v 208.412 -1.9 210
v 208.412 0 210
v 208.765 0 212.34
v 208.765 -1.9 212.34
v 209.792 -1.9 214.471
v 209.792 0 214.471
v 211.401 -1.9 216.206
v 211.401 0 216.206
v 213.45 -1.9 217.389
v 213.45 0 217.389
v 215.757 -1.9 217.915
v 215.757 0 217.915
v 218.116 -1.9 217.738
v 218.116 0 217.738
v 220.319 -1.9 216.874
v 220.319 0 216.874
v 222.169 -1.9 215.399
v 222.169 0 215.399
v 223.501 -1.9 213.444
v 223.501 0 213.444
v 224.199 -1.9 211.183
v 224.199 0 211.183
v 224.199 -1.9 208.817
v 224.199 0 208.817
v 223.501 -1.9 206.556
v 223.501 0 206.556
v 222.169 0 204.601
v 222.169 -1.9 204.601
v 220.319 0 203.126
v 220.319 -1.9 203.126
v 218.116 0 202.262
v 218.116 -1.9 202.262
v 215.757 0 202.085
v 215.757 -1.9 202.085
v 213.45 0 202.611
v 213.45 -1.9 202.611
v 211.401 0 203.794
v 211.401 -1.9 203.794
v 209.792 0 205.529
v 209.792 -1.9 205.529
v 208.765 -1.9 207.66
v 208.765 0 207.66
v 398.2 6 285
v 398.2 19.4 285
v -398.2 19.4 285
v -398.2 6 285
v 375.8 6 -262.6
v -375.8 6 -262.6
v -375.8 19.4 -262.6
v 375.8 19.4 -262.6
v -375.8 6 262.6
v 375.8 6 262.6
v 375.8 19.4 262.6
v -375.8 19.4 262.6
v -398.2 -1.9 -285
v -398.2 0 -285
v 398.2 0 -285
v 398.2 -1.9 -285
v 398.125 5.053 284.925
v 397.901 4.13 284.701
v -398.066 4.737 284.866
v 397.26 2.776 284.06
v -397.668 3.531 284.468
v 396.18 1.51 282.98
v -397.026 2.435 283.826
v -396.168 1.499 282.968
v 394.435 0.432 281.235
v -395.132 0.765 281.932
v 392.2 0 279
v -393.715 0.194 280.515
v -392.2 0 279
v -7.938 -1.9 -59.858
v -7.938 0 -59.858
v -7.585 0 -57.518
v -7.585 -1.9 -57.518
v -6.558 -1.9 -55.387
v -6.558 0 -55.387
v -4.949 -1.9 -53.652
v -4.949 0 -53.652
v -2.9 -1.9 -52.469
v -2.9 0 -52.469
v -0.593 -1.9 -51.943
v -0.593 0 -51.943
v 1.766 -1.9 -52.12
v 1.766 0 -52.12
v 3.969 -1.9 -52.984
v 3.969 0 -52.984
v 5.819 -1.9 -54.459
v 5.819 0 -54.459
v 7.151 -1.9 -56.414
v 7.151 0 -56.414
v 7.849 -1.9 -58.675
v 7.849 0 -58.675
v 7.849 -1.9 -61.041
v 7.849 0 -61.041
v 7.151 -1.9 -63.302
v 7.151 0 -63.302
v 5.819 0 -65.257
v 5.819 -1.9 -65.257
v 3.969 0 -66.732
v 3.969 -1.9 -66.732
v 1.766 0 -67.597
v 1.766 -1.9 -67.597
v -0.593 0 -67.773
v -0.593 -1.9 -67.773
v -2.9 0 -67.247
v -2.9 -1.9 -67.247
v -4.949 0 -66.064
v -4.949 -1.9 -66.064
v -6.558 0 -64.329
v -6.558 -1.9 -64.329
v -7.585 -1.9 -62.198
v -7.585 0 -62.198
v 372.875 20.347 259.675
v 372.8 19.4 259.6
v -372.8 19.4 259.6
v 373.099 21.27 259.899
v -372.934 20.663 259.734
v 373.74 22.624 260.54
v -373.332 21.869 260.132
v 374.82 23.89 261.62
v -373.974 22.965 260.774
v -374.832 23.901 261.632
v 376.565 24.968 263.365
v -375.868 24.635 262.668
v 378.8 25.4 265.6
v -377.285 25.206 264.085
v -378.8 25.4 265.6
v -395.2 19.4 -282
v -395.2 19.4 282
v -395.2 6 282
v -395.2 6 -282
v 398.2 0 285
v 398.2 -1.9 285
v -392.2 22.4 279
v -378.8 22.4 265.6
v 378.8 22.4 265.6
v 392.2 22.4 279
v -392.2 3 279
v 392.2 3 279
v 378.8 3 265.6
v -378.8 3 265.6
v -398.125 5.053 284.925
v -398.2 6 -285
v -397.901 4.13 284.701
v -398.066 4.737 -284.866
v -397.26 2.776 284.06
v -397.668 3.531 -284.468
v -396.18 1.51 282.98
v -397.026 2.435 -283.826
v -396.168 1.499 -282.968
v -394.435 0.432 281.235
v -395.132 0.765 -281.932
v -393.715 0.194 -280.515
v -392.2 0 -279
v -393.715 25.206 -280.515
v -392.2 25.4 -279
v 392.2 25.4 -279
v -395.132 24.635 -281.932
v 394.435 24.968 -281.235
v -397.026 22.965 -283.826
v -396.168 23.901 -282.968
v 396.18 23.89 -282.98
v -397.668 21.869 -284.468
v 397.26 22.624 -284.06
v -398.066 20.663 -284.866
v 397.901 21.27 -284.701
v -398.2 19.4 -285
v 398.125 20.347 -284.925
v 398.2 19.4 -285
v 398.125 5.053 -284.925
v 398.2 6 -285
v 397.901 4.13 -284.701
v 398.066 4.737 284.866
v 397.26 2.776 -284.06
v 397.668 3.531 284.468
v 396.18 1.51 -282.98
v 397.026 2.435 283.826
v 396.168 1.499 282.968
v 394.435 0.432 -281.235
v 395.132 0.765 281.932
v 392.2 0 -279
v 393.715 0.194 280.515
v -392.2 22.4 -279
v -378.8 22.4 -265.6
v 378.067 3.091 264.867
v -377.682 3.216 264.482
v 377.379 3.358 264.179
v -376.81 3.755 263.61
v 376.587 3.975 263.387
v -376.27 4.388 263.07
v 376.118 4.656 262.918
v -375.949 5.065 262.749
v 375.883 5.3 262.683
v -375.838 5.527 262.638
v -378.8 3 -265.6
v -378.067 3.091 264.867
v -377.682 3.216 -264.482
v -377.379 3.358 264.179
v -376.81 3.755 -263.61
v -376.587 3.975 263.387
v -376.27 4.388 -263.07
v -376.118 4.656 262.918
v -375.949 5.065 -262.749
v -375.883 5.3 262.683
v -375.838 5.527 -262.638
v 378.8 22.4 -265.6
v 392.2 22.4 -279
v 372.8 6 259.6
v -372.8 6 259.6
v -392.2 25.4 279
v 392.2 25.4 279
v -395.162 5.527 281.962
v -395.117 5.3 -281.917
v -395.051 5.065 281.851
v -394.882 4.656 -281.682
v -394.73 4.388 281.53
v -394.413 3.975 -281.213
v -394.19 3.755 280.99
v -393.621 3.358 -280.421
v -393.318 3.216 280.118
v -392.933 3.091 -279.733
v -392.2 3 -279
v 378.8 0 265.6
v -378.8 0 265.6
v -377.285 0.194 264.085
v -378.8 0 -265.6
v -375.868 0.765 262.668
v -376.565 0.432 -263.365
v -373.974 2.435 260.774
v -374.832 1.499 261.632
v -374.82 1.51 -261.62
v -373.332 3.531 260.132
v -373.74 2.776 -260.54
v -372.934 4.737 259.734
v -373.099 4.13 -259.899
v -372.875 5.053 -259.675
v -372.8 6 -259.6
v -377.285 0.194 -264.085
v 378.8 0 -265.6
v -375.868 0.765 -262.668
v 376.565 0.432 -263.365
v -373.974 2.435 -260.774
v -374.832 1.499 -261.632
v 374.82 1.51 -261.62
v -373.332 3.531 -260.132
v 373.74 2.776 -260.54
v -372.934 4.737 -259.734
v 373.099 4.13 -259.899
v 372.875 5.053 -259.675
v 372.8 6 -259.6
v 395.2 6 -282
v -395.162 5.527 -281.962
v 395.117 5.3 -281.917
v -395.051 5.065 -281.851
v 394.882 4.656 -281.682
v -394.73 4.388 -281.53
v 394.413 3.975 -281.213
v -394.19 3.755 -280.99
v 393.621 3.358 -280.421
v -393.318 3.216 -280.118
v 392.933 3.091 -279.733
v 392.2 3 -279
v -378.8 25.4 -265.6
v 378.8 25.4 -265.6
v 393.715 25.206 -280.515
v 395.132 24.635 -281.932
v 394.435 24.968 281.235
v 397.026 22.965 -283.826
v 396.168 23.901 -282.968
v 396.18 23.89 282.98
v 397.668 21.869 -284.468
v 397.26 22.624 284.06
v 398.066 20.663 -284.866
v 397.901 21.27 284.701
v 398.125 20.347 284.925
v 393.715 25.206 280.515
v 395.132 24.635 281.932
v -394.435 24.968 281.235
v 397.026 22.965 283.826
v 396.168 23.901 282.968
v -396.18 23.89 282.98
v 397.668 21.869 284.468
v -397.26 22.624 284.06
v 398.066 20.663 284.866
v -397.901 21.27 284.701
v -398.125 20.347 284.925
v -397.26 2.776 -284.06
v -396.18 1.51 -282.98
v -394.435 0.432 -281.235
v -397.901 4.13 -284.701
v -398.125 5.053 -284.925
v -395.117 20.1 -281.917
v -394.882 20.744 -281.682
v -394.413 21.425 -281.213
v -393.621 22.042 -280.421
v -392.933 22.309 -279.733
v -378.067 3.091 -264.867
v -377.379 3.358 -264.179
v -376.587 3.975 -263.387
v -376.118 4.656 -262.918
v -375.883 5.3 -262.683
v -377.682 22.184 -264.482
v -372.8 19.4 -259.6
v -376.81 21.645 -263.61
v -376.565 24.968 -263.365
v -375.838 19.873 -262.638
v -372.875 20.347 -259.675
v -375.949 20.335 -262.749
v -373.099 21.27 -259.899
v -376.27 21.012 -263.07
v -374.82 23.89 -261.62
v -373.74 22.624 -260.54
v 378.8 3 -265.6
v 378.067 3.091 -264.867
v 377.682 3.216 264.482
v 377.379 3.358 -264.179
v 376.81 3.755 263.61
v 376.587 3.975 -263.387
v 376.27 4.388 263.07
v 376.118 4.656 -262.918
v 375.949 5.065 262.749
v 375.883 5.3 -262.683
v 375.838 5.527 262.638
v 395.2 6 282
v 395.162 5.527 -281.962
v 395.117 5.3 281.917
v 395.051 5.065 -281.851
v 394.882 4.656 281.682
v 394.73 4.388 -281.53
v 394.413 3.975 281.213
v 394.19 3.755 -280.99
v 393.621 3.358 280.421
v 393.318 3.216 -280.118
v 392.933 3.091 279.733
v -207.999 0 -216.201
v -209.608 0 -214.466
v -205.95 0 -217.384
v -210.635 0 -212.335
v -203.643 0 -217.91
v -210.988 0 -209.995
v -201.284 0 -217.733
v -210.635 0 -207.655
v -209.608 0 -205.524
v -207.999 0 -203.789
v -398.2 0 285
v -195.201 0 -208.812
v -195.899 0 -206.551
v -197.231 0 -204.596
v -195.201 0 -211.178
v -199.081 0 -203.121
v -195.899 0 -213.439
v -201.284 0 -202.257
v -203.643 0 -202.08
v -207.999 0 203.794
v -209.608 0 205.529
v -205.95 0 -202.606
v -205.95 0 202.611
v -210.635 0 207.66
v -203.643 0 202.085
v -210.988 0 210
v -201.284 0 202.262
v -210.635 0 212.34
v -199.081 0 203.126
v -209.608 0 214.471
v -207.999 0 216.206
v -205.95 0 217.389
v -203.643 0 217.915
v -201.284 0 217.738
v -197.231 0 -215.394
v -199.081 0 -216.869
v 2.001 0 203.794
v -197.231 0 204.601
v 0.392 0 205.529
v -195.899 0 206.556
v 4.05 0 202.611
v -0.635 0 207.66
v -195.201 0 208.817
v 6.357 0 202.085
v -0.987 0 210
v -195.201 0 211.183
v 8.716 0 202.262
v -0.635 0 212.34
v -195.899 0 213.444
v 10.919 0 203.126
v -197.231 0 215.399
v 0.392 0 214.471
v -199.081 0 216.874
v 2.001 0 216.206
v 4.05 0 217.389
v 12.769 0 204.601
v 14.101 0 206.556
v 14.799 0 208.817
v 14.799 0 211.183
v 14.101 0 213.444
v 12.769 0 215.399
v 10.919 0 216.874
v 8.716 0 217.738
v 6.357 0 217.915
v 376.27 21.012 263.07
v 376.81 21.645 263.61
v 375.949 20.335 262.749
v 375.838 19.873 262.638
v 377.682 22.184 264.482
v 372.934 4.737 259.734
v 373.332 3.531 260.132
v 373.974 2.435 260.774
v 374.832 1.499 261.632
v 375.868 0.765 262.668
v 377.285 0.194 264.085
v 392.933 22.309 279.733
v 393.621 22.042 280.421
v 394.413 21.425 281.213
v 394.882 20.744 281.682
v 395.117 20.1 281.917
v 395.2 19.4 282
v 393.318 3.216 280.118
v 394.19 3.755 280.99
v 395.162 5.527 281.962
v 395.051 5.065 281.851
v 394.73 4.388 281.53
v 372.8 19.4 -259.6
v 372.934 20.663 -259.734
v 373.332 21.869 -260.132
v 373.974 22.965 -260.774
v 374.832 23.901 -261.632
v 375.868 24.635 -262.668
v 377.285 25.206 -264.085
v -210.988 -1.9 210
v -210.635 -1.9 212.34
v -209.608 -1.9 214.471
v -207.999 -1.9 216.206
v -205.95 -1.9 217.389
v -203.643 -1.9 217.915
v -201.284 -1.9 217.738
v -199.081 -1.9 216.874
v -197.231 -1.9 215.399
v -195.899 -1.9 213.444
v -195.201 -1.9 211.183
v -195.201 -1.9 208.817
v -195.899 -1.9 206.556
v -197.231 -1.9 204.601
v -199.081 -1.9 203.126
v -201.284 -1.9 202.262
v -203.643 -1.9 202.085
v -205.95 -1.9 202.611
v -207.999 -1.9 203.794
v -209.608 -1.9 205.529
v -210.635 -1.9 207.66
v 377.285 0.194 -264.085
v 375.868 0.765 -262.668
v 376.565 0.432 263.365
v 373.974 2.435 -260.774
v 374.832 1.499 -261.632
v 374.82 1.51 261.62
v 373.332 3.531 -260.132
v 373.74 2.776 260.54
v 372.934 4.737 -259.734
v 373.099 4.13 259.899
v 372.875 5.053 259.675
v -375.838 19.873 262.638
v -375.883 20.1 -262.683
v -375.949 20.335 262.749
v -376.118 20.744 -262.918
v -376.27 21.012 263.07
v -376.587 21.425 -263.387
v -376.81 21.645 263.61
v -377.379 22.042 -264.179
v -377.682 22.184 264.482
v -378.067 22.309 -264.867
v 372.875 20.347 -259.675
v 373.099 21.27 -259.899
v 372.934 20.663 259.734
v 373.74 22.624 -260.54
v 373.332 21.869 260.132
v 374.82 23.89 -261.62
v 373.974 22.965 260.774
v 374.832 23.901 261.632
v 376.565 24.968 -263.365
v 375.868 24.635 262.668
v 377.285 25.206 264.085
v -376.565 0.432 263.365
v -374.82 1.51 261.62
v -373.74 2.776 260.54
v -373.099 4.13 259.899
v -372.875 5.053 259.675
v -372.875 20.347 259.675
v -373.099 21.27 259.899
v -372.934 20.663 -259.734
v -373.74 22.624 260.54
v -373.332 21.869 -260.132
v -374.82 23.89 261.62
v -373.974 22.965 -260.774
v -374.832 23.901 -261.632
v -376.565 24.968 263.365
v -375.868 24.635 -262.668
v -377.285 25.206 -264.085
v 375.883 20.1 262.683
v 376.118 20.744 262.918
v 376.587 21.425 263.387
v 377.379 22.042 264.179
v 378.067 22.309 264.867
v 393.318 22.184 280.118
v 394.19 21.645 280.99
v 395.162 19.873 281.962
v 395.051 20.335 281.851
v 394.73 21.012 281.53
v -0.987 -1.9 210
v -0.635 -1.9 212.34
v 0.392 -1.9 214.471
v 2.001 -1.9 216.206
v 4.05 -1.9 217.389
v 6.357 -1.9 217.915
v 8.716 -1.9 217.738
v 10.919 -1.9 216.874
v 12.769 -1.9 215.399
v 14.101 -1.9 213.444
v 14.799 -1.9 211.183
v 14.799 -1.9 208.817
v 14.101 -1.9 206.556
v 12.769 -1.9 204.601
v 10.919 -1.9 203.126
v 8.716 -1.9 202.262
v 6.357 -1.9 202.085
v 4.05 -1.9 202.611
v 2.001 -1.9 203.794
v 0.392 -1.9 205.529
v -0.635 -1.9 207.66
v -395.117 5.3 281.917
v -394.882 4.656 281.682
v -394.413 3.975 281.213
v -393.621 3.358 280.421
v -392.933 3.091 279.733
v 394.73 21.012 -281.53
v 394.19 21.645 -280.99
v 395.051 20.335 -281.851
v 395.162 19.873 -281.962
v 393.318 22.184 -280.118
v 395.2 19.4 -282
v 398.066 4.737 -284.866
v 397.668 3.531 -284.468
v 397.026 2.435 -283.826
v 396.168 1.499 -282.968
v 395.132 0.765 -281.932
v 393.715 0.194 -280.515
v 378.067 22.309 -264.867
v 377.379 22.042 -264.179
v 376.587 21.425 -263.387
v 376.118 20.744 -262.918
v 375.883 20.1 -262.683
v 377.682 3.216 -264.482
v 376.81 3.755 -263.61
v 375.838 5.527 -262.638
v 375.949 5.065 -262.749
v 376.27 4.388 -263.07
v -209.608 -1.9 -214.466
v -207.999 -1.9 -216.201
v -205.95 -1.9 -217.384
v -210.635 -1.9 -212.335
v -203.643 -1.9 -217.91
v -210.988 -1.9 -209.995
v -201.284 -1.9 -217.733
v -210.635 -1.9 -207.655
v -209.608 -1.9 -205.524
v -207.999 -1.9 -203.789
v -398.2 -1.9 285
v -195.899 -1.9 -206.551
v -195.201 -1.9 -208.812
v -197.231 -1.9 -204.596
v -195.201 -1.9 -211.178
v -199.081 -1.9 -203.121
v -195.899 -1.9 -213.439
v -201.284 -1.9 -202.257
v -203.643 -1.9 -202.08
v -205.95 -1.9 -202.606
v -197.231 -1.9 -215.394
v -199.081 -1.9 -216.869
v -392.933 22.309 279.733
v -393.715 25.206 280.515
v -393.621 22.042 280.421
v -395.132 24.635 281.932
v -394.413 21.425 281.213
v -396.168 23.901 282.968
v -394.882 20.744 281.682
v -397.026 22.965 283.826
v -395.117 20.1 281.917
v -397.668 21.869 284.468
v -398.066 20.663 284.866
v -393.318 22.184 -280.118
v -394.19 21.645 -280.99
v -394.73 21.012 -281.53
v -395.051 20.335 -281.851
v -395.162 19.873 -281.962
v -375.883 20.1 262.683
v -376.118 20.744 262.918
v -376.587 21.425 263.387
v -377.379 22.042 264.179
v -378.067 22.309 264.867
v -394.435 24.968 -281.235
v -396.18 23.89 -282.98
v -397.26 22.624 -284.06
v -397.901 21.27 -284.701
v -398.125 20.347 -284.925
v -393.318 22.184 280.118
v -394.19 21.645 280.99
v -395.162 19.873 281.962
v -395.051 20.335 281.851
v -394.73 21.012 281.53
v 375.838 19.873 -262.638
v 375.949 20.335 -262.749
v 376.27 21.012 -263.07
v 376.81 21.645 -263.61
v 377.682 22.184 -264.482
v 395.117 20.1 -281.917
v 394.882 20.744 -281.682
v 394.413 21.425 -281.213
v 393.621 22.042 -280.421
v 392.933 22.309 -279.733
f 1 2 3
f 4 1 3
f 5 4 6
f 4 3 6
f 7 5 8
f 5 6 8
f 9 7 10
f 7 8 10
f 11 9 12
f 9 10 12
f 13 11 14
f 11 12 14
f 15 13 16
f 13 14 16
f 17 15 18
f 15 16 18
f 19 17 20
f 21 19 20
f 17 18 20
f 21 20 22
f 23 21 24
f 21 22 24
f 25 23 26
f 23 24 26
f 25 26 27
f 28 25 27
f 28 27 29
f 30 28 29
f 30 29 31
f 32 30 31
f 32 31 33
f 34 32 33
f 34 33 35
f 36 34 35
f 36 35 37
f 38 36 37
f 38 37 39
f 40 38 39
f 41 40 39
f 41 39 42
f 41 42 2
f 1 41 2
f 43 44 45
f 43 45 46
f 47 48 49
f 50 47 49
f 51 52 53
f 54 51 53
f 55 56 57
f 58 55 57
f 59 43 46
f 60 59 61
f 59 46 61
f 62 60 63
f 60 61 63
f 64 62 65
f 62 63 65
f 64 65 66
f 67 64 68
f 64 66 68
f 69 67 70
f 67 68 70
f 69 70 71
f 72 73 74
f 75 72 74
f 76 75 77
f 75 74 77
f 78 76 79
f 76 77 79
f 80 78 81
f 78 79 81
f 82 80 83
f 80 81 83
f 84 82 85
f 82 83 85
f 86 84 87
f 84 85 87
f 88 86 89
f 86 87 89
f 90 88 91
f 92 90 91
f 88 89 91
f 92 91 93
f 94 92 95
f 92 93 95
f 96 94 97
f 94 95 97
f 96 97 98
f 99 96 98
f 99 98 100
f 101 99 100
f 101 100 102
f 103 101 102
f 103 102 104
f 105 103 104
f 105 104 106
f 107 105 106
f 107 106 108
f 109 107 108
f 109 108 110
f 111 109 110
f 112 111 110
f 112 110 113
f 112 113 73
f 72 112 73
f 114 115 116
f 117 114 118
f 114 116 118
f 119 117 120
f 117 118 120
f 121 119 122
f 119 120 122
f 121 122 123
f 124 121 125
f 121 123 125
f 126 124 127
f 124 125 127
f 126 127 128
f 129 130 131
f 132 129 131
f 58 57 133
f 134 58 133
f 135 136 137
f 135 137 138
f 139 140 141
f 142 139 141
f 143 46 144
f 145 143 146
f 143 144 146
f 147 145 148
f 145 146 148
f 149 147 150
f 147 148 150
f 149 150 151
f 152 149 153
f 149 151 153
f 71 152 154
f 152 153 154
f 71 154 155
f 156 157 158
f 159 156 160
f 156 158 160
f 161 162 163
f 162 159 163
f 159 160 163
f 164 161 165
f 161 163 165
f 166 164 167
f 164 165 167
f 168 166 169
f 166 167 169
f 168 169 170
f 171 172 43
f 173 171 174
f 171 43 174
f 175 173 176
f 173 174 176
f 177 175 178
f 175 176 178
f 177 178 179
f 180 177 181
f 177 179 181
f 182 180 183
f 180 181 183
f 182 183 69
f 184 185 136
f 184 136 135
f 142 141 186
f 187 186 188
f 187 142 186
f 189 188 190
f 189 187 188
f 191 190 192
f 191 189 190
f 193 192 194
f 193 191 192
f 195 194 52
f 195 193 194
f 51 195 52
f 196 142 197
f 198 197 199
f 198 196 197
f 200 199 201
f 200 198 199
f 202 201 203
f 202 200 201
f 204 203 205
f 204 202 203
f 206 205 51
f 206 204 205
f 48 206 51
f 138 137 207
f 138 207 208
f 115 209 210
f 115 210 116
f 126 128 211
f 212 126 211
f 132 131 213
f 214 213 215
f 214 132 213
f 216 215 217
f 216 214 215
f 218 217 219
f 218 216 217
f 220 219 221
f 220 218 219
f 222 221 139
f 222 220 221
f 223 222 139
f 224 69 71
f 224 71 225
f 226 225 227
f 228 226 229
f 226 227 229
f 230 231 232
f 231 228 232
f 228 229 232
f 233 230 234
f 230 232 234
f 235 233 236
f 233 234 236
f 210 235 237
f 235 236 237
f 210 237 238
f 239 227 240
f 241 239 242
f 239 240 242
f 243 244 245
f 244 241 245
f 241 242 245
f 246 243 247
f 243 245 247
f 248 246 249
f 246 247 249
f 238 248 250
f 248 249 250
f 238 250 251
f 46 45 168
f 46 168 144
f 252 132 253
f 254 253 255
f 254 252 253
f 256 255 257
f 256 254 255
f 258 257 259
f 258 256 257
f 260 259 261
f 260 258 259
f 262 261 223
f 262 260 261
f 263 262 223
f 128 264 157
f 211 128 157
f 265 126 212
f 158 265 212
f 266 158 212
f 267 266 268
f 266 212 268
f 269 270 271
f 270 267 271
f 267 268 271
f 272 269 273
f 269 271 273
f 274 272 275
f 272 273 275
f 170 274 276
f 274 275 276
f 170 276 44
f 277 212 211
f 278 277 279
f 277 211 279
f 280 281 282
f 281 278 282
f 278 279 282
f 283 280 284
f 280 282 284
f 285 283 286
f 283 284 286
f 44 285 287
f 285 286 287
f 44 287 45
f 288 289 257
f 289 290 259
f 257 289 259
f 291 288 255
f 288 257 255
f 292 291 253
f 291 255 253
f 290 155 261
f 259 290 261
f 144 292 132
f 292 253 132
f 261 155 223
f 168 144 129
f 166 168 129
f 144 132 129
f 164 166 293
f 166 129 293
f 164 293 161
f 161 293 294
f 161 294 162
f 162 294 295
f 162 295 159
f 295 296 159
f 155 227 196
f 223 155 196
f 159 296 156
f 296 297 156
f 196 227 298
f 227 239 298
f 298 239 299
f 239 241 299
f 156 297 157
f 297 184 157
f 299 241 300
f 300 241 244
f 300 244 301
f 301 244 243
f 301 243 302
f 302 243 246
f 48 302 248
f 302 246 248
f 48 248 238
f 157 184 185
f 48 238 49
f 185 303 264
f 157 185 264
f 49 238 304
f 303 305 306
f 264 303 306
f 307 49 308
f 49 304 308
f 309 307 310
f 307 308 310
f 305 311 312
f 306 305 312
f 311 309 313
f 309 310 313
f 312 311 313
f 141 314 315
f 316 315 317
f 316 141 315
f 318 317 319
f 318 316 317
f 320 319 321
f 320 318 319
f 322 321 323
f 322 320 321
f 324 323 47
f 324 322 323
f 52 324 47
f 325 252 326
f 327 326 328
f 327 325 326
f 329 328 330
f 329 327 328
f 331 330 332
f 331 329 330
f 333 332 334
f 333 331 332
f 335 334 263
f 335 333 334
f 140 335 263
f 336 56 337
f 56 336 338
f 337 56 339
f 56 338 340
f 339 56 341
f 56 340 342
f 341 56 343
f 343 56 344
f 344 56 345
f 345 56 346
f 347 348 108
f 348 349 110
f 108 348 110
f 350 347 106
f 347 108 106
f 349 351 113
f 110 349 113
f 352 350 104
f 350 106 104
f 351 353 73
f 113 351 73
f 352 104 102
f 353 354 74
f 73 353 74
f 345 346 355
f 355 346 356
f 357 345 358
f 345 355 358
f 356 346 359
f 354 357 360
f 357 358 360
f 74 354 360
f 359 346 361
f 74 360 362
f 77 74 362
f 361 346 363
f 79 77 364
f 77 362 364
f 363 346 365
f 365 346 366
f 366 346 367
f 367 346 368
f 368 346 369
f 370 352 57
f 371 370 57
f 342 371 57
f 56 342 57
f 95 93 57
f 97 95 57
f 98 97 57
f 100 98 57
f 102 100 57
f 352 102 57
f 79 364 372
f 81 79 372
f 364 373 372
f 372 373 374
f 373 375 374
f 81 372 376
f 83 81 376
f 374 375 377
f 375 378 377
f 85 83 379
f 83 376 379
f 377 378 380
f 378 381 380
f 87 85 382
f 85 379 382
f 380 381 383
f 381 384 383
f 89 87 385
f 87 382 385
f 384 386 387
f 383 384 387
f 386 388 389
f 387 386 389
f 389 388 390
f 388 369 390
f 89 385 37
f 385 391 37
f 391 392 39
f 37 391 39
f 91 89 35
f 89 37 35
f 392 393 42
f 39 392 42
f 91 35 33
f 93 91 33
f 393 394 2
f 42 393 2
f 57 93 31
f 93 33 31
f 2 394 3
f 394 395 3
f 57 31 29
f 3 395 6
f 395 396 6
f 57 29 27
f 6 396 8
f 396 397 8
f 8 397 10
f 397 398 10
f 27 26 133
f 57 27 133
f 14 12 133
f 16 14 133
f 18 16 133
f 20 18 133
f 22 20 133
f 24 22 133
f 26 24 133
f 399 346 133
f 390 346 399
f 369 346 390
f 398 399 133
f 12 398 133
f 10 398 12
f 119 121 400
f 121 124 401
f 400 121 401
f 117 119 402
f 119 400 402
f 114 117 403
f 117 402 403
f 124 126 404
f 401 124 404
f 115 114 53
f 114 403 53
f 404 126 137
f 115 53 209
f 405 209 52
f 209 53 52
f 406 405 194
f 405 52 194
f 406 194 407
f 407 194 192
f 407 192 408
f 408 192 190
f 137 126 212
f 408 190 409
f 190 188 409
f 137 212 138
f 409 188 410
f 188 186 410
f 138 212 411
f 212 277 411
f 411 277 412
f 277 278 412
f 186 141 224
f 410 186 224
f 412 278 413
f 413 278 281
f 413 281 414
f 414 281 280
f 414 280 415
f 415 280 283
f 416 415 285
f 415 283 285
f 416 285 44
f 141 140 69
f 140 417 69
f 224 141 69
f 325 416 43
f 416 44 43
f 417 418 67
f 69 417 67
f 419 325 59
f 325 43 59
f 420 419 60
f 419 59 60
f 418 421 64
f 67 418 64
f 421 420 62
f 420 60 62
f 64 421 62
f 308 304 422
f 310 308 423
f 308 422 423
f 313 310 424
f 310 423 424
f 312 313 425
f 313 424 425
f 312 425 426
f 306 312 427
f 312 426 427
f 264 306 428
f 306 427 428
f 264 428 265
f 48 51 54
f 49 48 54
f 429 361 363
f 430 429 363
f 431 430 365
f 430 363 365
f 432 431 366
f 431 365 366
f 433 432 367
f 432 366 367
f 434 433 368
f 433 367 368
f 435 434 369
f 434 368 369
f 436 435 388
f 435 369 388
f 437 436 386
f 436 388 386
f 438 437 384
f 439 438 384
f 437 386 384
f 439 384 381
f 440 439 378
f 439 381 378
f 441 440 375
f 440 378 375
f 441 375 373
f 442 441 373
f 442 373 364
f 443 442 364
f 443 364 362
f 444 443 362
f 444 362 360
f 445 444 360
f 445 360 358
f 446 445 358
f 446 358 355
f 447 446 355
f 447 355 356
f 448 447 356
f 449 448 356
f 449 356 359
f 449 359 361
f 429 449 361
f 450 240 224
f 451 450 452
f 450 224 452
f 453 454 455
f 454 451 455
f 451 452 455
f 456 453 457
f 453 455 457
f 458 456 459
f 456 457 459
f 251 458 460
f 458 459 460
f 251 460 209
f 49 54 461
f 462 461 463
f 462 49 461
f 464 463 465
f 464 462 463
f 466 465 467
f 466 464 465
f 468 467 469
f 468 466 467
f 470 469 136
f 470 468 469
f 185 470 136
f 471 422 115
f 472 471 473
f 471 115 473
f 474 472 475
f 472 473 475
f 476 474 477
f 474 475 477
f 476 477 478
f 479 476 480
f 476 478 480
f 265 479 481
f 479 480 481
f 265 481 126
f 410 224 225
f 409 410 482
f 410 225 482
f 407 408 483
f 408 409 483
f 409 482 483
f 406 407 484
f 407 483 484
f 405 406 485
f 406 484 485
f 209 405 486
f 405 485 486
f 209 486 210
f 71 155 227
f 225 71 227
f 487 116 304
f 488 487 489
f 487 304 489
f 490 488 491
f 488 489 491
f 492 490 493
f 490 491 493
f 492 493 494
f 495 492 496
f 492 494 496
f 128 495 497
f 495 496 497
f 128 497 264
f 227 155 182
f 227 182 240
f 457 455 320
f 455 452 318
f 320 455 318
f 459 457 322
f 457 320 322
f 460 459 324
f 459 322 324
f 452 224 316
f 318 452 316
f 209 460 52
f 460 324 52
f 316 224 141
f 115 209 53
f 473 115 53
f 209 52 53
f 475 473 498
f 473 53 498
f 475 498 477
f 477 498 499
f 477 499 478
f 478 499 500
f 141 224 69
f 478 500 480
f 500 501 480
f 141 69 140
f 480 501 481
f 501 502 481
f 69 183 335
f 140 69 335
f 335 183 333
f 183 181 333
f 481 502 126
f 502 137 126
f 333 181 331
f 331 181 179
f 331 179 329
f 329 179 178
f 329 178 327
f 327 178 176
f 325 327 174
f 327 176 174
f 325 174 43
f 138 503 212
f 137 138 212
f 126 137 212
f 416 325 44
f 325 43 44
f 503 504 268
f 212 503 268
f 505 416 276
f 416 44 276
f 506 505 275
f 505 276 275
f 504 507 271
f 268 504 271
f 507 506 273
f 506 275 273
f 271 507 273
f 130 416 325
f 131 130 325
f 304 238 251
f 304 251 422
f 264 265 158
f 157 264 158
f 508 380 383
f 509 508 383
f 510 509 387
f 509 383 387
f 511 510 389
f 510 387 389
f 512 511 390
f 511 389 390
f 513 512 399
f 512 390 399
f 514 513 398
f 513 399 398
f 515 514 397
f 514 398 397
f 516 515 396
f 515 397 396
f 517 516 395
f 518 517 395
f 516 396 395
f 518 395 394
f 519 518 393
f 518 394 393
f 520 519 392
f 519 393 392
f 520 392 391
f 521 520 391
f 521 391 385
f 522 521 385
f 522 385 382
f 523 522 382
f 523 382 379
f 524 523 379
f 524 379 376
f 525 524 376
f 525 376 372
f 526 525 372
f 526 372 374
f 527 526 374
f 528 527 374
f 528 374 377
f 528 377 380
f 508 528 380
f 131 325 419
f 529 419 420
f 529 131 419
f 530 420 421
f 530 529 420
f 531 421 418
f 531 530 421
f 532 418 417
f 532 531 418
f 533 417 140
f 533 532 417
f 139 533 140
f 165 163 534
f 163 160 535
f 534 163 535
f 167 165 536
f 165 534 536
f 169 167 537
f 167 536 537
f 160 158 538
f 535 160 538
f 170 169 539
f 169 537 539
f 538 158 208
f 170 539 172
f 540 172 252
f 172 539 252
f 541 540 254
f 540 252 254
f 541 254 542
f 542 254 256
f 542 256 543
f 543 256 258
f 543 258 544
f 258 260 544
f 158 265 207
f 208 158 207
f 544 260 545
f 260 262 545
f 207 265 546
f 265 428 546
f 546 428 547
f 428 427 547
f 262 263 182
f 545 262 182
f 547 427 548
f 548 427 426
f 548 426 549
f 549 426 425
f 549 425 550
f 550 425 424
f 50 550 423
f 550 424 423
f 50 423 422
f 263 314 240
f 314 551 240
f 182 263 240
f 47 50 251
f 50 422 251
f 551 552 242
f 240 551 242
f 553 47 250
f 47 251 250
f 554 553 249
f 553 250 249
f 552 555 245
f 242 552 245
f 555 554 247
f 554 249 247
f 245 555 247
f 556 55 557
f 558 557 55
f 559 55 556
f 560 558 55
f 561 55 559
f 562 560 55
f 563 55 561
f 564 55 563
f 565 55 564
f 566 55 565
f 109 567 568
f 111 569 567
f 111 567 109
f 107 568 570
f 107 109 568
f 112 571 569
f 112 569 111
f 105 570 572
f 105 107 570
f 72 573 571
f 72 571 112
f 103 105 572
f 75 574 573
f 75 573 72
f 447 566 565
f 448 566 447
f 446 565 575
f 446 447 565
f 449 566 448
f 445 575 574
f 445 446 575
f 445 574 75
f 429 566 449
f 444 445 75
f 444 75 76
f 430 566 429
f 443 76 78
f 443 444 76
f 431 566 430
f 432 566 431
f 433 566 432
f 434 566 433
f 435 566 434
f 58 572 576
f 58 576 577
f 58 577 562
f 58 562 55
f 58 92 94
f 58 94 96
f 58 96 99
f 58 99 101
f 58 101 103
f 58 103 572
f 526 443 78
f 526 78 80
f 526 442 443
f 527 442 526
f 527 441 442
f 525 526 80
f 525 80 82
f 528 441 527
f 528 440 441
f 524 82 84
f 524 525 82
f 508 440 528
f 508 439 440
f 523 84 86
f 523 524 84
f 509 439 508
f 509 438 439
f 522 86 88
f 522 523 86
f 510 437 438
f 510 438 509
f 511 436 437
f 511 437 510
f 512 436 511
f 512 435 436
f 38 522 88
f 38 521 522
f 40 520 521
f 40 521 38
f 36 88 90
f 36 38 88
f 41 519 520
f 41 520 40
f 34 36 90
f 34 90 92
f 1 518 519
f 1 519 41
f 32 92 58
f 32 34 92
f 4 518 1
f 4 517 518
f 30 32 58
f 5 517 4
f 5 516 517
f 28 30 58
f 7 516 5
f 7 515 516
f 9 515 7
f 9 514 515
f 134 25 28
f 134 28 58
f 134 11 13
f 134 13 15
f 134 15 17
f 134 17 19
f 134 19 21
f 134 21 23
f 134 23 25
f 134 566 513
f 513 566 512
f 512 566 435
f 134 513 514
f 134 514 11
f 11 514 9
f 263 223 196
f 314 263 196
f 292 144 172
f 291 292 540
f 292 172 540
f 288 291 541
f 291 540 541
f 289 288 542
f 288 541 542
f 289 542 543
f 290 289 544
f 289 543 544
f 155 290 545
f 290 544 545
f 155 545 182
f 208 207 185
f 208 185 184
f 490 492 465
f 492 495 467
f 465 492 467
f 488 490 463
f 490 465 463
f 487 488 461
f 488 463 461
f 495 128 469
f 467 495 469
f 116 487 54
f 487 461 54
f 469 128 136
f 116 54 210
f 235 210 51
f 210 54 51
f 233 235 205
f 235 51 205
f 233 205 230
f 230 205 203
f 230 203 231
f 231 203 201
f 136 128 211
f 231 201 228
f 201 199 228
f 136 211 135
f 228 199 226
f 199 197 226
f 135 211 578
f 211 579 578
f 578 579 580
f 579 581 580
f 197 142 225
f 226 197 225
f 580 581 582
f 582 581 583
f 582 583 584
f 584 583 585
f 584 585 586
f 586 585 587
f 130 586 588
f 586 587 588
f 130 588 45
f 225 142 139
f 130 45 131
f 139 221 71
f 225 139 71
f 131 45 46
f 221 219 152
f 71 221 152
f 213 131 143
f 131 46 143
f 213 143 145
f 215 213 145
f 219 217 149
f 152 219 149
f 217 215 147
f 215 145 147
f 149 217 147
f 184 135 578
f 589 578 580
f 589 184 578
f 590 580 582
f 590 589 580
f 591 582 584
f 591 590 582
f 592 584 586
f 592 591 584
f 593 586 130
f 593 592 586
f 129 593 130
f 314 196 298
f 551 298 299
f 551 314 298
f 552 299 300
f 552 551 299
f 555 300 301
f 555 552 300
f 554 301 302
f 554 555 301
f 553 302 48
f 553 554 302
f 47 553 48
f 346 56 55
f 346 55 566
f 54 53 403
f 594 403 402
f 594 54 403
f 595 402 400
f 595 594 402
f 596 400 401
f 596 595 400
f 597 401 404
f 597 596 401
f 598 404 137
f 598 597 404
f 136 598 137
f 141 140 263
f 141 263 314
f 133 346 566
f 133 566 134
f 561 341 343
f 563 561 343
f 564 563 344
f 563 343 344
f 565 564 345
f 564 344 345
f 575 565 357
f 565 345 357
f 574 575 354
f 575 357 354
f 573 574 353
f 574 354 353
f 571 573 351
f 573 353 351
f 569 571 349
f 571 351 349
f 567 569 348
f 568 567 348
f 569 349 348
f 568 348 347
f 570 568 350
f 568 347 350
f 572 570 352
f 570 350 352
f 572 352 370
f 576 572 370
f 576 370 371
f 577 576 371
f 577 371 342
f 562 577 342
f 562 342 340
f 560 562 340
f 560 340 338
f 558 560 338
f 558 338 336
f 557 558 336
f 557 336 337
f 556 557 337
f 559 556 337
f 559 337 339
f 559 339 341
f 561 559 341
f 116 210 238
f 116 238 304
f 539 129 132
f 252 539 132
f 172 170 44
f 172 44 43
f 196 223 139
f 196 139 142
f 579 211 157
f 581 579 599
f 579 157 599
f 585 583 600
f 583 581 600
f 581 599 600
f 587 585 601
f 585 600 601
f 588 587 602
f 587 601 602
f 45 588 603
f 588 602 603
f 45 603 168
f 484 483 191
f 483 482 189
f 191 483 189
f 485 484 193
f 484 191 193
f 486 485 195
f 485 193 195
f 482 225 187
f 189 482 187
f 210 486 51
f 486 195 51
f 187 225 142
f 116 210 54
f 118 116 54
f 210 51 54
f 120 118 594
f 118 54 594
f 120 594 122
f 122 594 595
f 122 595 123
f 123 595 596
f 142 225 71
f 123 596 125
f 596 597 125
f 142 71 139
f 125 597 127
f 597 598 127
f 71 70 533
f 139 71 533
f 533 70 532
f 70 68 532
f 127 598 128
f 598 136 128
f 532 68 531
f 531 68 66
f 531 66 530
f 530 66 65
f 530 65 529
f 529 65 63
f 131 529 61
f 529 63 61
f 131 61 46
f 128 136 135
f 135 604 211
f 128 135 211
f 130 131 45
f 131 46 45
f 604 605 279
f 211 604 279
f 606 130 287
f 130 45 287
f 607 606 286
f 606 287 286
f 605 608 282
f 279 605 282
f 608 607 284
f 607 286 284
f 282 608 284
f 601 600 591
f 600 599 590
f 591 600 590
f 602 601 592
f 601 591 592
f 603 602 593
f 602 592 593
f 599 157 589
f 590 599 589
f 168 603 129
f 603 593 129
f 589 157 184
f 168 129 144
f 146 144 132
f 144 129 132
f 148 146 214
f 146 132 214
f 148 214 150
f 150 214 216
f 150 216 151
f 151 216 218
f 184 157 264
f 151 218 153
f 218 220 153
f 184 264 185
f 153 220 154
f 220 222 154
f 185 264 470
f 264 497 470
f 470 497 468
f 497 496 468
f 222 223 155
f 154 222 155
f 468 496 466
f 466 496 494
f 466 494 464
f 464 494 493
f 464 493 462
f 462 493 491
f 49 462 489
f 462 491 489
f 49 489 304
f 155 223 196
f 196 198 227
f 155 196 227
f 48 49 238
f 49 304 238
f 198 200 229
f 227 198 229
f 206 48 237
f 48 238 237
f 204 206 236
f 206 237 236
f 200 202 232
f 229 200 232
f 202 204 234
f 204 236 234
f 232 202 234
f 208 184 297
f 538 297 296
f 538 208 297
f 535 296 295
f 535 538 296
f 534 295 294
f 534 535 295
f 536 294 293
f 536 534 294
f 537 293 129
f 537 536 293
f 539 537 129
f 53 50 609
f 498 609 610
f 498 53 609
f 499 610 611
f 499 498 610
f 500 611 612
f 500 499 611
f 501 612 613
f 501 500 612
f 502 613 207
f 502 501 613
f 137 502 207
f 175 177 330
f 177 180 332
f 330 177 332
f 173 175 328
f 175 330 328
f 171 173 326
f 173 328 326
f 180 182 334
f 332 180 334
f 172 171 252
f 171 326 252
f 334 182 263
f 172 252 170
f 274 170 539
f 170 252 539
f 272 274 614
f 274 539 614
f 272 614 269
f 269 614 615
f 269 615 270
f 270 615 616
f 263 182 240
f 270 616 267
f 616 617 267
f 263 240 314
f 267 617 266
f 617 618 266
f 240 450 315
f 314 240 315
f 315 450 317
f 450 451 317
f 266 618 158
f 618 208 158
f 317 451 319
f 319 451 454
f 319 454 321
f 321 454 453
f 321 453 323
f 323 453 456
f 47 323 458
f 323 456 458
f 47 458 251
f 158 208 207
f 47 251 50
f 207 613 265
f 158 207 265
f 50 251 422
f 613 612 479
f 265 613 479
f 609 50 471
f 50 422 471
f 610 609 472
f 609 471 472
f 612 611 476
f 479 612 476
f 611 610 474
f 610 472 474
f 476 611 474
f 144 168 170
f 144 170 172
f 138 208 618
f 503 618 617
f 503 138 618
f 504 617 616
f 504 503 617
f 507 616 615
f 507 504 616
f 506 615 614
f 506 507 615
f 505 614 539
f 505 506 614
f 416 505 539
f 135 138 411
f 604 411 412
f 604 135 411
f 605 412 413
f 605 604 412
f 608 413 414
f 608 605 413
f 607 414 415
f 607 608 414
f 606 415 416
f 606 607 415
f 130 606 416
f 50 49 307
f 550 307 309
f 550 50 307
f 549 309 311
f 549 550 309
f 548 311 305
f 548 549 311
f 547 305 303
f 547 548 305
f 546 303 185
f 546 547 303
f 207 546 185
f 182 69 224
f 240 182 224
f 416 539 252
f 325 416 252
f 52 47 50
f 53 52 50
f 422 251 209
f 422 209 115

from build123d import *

# Parameters (mm, degrees)
TUBO_CUADRADO_2_X_2_X_0_25_1_DEPTH      = 606.921024484
TUBO_CUADRADO_2_X_2_X_0_25_1_DEPTH_BACK = 36.921024484
TUBO_CUADRADO_2_X_2_X_0_25_1_2_DEPTH    = 870.242048969
TUBO_CUADRADO_2_X_2_X_0_25_1_3_DEPTH    = 643.842048969
TUBO_CUADRADO_2_X_2_X_0_25_1_4_DEPTH    = 870.242048969
CROQUIS3_W                              = 796.4
CROQUIS3_H                              = 570
SALIENTE_EXTRUIR1_DEPTH                 = 1.9
CROQUIS4_R                              = 7.9375
CORTAR_EXTRUIR1_DEPTH                   = 10


with BuildPart() as part:
    # Sketch1 → Tubo cuadrado 2 X 2 X 0.25(1) (new, two sides: drawn at the far end of the back side and taken through both)
    with BuildSketch(Plane(origin=(-385.5, 12.7, -285), x_dir=(1, 0, 0), z_dir=(0, 0, 1)).offset(-TUBO_CUADRADO_2_X_2_X_0_25_1_DEPTH_BACK)):
        with BuildLine():
            Line((-6.7, -12.7), (6.7, -12.7))
            ThreePointArc((6.7, -12.7), (10.942640687, -10.942640687), (12.7, -6.7))
            Line((12.7, -6.7), (12.7, 6.7))
            ThreePointArc((12.7, 6.7), (10.942640687, 10.942640687), (6.7, 12.7))
            Line((6.7, 12.7), (-6.7, 12.7))
            ThreePointArc((-6.7, 12.7), (-10.942640687, 10.942640687), (-12.7, 6.7))
            Line((-12.7, 6.7), (-12.7, -6.7))
            ThreePointArc((-12.7, -6.7), (-10.942640687, -10.942640687), (-6.7, -12.7))
        make_face()
        with BuildLine():
            Line((-6.7, -9.7), (6.7, -9.7))
            ThreePointArc((6.7, -9.7), (8.821320344, -8.821320344), (9.7, -6.7))
            Line((9.7, -6.7), (9.7, 6.7))
            ThreePointArc((9.7, 6.7), (8.821320344, 8.821320344), (6.7, 9.7))
            Line((6.7, 9.7), (-6.7, 9.7))
            ThreePointArc((-6.7, 9.7), (-8.821320344, 8.821320344), (-9.7, 6.7))
            Line((-9.7, 6.7), (-9.7, -6.7))
            ThreePointArc((-9.7, -6.7), (-8.821320344, -8.821320344), (-6.7, -9.7))
        make_face(mode=Mode.SUBTRACT)
    extrude(amount=TUBO_CUADRADO_2_X_2_X_0_25_1_DEPTH + TUBO_CUADRADO_2_X_2_X_0_25_1_DEPTH_BACK)

    # Tubo cuadrado 2 X 2 X 0.25(1) mitre 1
    split(bisect_by=Plane(origin=(-398.2, 0, -285), x_dir=(0, -1, 0), z_dir=(-0.707106781, 0, 0.707106781)), keep=Keep.TOP)

    # Tubo cuadrado 2 X 2 X 0.25(1) mitre 2
    split(bisect_by=Plane(origin=(-398.2, 0, 285), x_dir=(0, -1, 0), z_dir=(-0.707106781, 0, -0.707106781)), keep=Keep.TOP)


with BuildPart() as body_2:
    # Sketch1 on segment 2 (carried to segment 2) → Tubo cuadrado 2 X 2 X 0.25_1 2 (new body)
    with BuildSketch(Plane(origin=(-435.121024484, 12.7, 272.3), x_dir=(0, 0, -1), z_dir=(1, 0, 0))):
        with BuildLine():
            Line((-6.7, -12.7), (6.7, -12.7))
            ThreePointArc((6.7, -12.7), (10.942640687, -10.942640687), (12.7, -6.7))
            Line((12.7, -6.7), (12.7, 6.7))
            ThreePointArc((12.7, 6.7), (10.942640687, 10.942640687), (6.7, 12.7))
            Line((6.7, 12.7), (-6.7, 12.7))
            ThreePointArc((-6.7, 12.7), (-10.942640687, 10.942640687), (-12.7, 6.7))
            Line((-12.7, 6.7), (-12.7, -6.7))
            ThreePointArc((-12.7, -6.7), (-10.942640687, -10.942640687), (-6.7, -12.7))
        make_face()
        with BuildLine():
            Line((-6.7, -9.7), (6.7, -9.7))
            ThreePointArc((6.7, -9.7), (8.821320344, -8.821320344), (9.7, -6.7))
            Line((9.7, -6.7), (9.7, 6.7))
            ThreePointArc((9.7, 6.7), (8.821320344, 8.821320344), (6.7, 9.7))
            Line((6.7, 9.7), (-6.7, 9.7))
            ThreePointArc((-6.7, 9.7), (-8.821320344, 8.821320344), (-9.7, 6.7))
            Line((-9.7, 6.7), (-9.7, -6.7))
            ThreePointArc((-9.7, -6.7), (-8.821320344, -8.821320344), (-6.7, -9.7))
        make_face(mode=Mode.SUBTRACT)
    extrude(amount=TUBO_CUADRADO_2_X_2_X_0_25_1_2_DEPTH)

    # Tubo cuadrado 2 X 2 X 0.25_1 2 mitre 1
    split(bisect_by=Plane(origin=(-398.2, 0, 285), x_dir=(0, 1, 0), z_dir=(0.707106781, 0, 0.707106781)), keep=Keep.TOP)

    # Tubo cuadrado 2 X 2 X 0.25_1 2 mitre 2
    split(bisect_by=Plane(origin=(398.2, 0, 285), x_dir=(0, -1, 0), z_dir=(-0.707106781, 0, 0.707106781)), keep=Keep.TOP)


with BuildPart() as body_3:
    # Sketch1 on segment 3 (carried to segment 3) → Tubo cuadrado 2 X 2 X 0.25_1 3 (new body)
    with BuildSketch(Plane(origin=(385.5, 12.7, 321.921024484), x_dir=(-1, 0, 0), z_dir=(0, 0, -1))):
        with BuildLine():
            Line((-6.7, -12.7), (6.7, -12.7))
            ThreePointArc((6.7, -12.7), (10.942640687, -10.942640687), (12.7, -6.7))
            Line((12.7, -6.7), (12.7, 6.7))
            ThreePointArc((12.7, 6.7), (10.942640687, 10.942640687), (6.7, 12.7))
            Line((6.7, 12.7), (-6.7, 12.7))
            ThreePointArc((-6.7, 12.7), (-10.942640687, 10.942640687), (-12.7, 6.7))
            Line((-12.7, 6.7), (-12.7, -6.7))
            ThreePointArc((-12.7, -6.7), (-10.942640687, -10.942640687), (-6.7, -12.7))
        make_face()
        with BuildLine():
            Line((-6.7, -9.7), (6.7, -9.7))
            ThreePointArc((6.7, -9.7), (8.821320344, -8.821320344), (9.7, -6.7))
            Line((9.7, -6.7), (9.7, 6.7))
            ThreePointArc((9.7, 6.7), (8.821320344, 8.821320344), (6.7, 9.7))
            Line((6.7, 9.7), (-6.7, 9.7))
            ThreePointArc((-6.7, 9.7), (-8.821320344, 8.821320344), (-9.7, 6.7))
            Line((-9.7, 6.7), (-9.7, -6.7))
            ThreePointArc((-9.7, -6.7), (-8.821320344, -8.821320344), (-6.7, -9.7))
        make_face(mode=Mode.SUBTRACT)
    extrude(amount=TUBO_CUADRADO_2_X_2_X_0_25_1_3_DEPTH)

    # Tubo cuadrado 2 X 2 X 0.25_1 3 mitre 1
    split(bisect_by=Plane(origin=(398.2, 0, -285), x_dir=(0, 1, 0), z_dir=(0.707106781, 0, 0.707106781)), keep=Keep.TOP)

    # Tubo cuadrado 2 X 2 X 0.25_1 3 mitre 2
    split(bisect_by=Plane(origin=(398.2, 0, 285), x_dir=(0, 1, 0), z_dir=(0.707106781, 0, -0.707106781)), keep=Keep.TOP)


with BuildPart() as body_4:
    # Sketch1 on segment 4 (carried to segment 4) → Tubo cuadrado 2 X 2 X 0.25_1 4 (new body)
    with BuildSketch(Plane(origin=(435.121024484, 12.7, -272.3), x_dir=(0, 0, 1), z_dir=(-1, 0, 0))):
        with BuildLine():
            Line((-6.7, -12.7), (6.7, -12.7))
            ThreePointArc((6.7, -12.7), (10.942640687, -10.942640687), (12.7, -6.7))
            Line((12.7, -6.7), (12.7, 6.7))
            ThreePointArc((12.7, 6.7), (10.942640687, 10.942640687), (6.7, 12.7))
            Line((6.7, 12.7), (-6.7, 12.7))
            ThreePointArc((-6.7, 12.7), (-10.942640687, 10.942640687), (-12.7, 6.7))
            Line((-12.7, 6.7), (-12.7, -6.7))
            ThreePointArc((-12.7, -6.7), (-10.942640687, -10.942640687), (-6.7, -12.7))
        make_face()
        with BuildLine():
            Line((-6.7, -9.7), (6.7, -9.7))
            ThreePointArc((6.7, -9.7), (8.821320344, -8.821320344), (9.7, -6.7))
            Line((9.7, -6.7), (9.7, 6.7))
            ThreePointArc((9.7, 6.7), (8.821320344, 8.821320344), (6.7, 9.7))
            Line((6.7, 9.7), (-6.7, 9.7))
            ThreePointArc((-6.7, 9.7), (-8.821320344, 8.821320344), (-9.7, 6.7))
            Line((-9.7, 6.7), (-9.7, -6.7))
            ThreePointArc((-9.7, -6.7), (-8.821320344, -8.821320344), (-6.7, -9.7))
        make_face(mode=Mode.SUBTRACT)
    extrude(amount=TUBO_CUADRADO_2_X_2_X_0_25_1_4_DEPTH)

    # Tubo cuadrado 2 X 2 X 0.25_1 4 mitre 1
    split(bisect_by=Plane(origin=(-398.2, 0, -285), x_dir=(0, 1, 0), z_dir=(0.707106781, 0, -0.707106781)), keep=Keep.TOP)

    # Tubo cuadrado 2 X 2 X 0.25_1 4 mitre 2
    split(bisect_by=Plane(origin=(398.2, 0, -285), x_dir=(0, -1, 0), z_dir=(-0.707106781, 0, -0.707106781)), keep=Keep.TOP)


with BuildPart() as body_5:
    # Croquis3 → Saliente-Extruir1 (new body)
    with BuildSketch(Plane.XZ):
        Rectangle(CROQUIS3_W, CROQUIS3_H)
    extrude(amount=SALIENTE_EXTRUIR1_DEPTH)

    # Croquis4 → Cortar-Extruir1 (cut)
    with BuildSketch(Plane(origin=(0, 0, 0), x_dir=(1, 0, 0), z_dir=(0, 1, 0))):
        with Locations(Location((216.35, -210, 0), (0, 0, 180))):
            Circle(CROQUIS4_R)
        with Locations(Location((6.95, -210, 0), (0, 0, 180))):
            Circle(CROQUIS4_R)
        with Locations(Location((-203.05, -210, 0), (0, 0, 180))):
            Circle(CROQUIS4_R)
        with Locations(Location((-203.05, 209.995, 0), (0, 0, 180))):
            Circle(CROQUIS4_R)
        with Locations(Location((0, 59.858030887, 0), (0, 0, 180))):
            Circle(CROQUIS4_R)
    extrude(amount=-CORTAR_EXTRUIR1_DEPTH, mode=Mode.SUBTRACT)


solid = Compound([part.part, body_2.part, body_3.part, body_4.part, body_5.part])
